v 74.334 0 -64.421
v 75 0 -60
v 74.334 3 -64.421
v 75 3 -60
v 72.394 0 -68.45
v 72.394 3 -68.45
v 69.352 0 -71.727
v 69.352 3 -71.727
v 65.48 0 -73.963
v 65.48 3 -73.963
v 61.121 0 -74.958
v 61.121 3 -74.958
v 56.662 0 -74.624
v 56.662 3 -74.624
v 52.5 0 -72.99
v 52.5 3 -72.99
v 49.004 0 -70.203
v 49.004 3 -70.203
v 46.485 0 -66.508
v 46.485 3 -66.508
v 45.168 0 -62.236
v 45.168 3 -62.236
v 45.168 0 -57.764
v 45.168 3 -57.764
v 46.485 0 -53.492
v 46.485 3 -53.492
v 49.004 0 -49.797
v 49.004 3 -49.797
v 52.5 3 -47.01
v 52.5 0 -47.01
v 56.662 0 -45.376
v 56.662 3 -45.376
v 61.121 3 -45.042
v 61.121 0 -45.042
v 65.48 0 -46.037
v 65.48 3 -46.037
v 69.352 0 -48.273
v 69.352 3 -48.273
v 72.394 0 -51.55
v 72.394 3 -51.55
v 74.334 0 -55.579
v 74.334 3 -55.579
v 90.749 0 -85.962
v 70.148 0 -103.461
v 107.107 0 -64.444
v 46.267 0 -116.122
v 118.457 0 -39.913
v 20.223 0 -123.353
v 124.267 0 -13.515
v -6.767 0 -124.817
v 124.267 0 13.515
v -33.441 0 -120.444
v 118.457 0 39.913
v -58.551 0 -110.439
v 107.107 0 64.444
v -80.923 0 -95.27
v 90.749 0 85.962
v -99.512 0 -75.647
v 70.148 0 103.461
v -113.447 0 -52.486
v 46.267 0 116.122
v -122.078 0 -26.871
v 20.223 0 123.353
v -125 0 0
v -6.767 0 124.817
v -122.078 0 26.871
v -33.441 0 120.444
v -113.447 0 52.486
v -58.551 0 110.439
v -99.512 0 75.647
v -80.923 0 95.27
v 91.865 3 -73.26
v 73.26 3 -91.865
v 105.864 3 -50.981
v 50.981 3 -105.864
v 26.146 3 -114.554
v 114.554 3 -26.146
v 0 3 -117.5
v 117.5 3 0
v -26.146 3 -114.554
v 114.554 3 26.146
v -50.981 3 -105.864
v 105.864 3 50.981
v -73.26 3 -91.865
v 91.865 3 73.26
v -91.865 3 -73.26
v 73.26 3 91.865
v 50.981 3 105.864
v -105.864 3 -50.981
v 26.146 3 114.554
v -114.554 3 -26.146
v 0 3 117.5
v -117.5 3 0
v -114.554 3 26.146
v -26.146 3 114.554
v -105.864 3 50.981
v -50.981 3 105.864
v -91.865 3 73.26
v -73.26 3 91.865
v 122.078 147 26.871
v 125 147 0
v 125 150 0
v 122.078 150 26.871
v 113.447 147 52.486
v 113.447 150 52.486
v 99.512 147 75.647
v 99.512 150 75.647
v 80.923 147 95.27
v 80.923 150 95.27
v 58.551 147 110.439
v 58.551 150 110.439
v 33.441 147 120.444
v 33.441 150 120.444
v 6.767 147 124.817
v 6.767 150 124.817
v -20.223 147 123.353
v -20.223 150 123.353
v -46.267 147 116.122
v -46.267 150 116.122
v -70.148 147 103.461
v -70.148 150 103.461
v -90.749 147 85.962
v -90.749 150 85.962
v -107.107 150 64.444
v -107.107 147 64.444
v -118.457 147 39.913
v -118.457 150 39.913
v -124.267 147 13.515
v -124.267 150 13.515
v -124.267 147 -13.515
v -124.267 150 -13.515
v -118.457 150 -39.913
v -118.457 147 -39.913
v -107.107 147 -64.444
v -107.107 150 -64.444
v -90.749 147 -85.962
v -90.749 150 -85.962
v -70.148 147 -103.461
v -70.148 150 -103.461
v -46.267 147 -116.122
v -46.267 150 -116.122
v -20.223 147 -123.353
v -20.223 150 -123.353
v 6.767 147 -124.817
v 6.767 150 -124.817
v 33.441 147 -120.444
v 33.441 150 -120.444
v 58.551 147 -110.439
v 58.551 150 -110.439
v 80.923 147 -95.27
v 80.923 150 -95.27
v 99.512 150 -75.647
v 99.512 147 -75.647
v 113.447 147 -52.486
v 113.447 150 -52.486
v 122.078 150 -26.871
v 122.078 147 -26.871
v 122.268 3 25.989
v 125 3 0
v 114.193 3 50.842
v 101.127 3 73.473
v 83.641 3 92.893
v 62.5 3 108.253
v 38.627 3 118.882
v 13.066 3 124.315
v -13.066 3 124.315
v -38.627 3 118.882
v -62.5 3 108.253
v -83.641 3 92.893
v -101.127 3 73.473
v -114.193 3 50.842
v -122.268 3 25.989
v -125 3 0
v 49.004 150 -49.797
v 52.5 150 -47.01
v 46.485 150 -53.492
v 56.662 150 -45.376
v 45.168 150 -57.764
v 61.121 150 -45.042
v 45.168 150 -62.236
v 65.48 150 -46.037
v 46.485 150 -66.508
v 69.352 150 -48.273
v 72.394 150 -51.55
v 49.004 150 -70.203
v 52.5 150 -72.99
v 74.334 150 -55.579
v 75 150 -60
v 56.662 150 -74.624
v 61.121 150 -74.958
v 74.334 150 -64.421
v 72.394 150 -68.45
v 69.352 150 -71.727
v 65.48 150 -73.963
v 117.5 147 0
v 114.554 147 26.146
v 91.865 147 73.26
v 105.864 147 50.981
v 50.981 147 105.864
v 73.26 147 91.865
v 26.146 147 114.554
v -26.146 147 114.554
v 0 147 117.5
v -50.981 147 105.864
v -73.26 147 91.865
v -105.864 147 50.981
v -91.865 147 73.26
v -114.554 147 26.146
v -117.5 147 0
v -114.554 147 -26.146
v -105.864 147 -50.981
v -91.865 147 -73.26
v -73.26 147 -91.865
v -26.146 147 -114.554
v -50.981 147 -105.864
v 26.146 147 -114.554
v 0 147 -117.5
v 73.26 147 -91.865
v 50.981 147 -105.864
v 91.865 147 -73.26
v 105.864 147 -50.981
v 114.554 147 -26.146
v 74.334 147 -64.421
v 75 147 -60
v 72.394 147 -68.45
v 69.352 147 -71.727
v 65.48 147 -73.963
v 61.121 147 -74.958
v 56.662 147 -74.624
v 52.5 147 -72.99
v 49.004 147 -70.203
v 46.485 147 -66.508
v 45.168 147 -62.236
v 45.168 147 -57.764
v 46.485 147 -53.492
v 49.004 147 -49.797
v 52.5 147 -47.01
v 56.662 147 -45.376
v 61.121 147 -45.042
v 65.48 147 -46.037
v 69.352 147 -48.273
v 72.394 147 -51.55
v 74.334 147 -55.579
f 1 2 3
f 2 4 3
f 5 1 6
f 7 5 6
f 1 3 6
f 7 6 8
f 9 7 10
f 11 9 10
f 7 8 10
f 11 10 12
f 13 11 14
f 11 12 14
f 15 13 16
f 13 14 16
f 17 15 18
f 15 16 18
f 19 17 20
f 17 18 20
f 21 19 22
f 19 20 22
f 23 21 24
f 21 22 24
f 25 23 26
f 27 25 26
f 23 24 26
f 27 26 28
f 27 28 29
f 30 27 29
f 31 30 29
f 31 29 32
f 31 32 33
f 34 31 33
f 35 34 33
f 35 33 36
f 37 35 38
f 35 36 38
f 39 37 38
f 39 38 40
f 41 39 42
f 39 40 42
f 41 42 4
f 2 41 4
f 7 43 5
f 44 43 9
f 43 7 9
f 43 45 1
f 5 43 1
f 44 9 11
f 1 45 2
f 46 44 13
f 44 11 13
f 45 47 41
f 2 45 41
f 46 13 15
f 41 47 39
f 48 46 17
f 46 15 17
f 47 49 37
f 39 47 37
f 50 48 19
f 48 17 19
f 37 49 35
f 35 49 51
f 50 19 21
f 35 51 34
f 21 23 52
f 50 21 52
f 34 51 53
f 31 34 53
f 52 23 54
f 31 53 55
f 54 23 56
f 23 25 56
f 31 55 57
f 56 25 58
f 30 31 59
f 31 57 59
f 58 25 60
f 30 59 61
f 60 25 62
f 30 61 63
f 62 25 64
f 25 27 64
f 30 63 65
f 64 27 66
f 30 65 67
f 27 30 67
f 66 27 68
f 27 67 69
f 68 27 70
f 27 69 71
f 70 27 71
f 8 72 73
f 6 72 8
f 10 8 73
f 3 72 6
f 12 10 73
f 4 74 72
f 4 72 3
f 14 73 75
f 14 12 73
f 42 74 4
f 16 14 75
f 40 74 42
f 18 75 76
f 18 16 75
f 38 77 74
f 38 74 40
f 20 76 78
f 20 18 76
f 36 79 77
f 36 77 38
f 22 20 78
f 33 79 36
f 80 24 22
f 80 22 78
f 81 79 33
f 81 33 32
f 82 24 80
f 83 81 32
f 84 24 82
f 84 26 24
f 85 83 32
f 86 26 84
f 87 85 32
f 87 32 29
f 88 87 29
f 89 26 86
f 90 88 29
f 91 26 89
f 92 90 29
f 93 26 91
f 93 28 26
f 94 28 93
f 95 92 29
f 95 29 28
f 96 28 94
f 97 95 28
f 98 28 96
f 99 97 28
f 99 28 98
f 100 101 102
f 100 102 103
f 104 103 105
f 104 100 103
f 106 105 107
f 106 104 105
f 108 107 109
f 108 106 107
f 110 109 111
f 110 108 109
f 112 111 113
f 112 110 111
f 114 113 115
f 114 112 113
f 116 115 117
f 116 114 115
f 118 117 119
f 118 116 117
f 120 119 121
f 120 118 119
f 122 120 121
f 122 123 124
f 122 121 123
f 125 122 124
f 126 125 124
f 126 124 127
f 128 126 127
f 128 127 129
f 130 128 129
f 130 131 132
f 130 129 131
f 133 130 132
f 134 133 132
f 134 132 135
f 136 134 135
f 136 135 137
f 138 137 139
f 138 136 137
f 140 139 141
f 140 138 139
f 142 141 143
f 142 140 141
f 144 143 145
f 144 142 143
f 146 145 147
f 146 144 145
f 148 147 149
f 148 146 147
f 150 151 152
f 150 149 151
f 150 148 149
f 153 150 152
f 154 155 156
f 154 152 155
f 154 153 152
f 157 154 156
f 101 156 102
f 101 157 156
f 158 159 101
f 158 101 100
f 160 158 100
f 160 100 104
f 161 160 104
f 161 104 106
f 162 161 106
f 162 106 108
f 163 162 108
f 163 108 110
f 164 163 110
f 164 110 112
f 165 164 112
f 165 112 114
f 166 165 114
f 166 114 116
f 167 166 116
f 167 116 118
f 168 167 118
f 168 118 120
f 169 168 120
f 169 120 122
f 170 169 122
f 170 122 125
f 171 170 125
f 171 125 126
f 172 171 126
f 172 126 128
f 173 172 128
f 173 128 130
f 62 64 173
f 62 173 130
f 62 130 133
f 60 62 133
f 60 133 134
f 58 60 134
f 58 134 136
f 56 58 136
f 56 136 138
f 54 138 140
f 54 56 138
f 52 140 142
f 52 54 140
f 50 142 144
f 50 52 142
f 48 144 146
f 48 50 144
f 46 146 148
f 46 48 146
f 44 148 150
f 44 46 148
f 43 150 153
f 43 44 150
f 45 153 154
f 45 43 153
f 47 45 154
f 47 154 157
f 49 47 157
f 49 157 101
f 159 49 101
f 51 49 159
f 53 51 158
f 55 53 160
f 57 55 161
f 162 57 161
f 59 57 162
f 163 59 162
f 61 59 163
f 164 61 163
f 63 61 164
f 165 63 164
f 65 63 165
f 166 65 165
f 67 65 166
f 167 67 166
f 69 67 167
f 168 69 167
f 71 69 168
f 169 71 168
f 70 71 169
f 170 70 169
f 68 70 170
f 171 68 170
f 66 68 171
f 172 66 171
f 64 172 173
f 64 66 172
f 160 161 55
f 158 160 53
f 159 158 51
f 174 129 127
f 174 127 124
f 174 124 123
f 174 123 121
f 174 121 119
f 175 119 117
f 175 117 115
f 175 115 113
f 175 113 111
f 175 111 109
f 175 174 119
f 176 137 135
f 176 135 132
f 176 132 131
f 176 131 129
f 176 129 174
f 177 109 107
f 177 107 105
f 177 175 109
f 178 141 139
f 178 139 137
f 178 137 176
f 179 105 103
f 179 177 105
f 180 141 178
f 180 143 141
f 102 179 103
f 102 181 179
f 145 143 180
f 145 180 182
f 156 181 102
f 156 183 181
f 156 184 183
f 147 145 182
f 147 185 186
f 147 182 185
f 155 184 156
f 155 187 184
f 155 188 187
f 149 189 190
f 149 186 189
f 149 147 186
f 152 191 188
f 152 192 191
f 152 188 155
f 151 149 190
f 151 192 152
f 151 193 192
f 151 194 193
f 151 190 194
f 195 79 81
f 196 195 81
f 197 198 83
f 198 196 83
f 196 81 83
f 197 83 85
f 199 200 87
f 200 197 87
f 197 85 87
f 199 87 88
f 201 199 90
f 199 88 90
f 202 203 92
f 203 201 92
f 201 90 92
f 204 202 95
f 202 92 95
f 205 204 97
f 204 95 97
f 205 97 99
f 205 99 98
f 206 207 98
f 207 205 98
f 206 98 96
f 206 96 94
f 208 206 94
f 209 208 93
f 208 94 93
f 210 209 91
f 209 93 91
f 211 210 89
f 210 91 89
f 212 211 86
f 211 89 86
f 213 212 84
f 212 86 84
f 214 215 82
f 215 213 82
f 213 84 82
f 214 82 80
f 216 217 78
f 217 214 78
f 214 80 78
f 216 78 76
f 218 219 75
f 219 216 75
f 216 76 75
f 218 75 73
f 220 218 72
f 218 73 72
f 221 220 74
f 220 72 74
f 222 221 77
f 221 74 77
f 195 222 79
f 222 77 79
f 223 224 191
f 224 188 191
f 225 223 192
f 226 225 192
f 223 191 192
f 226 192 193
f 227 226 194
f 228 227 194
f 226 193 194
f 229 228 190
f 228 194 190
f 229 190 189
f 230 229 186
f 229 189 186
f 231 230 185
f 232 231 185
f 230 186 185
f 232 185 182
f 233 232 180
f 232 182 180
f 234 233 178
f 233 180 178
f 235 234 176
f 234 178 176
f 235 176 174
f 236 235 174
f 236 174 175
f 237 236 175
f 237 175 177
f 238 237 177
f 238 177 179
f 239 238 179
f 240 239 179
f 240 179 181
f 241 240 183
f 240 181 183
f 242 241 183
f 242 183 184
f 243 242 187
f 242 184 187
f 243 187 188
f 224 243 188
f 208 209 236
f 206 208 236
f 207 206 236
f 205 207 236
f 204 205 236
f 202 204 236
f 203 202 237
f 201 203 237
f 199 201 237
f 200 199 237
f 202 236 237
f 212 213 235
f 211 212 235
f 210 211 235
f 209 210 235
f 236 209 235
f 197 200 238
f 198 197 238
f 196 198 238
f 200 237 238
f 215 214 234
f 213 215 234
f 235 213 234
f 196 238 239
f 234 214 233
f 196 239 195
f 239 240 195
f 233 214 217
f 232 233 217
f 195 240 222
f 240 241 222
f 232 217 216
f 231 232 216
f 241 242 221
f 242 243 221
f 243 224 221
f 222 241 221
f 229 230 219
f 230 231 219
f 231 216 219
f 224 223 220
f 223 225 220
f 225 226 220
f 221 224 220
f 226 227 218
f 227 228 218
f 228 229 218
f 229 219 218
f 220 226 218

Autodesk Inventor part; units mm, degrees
ref_plane "YZ Plane" through (0, 0, 0) normal (1, 0, 0) x (0, 1, 0)
ref_plane "XZ Plane" through (0, 0, 0) normal (0, 1, 0) x (-1, 0, 0)
ref_plane "XY Plane" through (0, 0, 0) normal (0, 0, 1) x (1, 0, 0)
sketch "スケッチ1" plane through (0, 0, 0) normal (0, 1, 0) x (-1, 0, 0)
  circle A0 centre (0, 0) radius 125
  dimension "d0" = 250
extrude "押し出し1" add sketch "スケッチ1" along normal blind 3
sketch "スケッチ2" plane through (0, 3, 0) normal (0, 1, 0) x (1, 0, 0)
  circle A0 centre (0, 0) radius 125
  circle A1 centre (0, 0) radius 117.5
  dimension "d3" = 250
  dimension "d4" = 235
extrude "押し出し2" add sketch "スケッチ2" along normal blind 144
sketch "スケッチ3" plane through (0, 147, 0) normal (0, 1, 0) x (1, 0, 0)
  circle A0 centre (0, 0) radius 125
extrude "押し出し3" add sketch "スケッチ3" along normal blind 3
sketch "スケッチ4" plane through (0, 150, 0) normal (0, 1, 0) x (1, 0, 0)
  circle A0 centre (60, 60) radius 15
  point P0 (0, 0)
  dimension "d9" = 30
  dimension "d10" = 60
  dimension "d11" = 60
extrude "押し出し4" cut sketch "スケッチ4" against normal through all
properties part number "dummy1"
